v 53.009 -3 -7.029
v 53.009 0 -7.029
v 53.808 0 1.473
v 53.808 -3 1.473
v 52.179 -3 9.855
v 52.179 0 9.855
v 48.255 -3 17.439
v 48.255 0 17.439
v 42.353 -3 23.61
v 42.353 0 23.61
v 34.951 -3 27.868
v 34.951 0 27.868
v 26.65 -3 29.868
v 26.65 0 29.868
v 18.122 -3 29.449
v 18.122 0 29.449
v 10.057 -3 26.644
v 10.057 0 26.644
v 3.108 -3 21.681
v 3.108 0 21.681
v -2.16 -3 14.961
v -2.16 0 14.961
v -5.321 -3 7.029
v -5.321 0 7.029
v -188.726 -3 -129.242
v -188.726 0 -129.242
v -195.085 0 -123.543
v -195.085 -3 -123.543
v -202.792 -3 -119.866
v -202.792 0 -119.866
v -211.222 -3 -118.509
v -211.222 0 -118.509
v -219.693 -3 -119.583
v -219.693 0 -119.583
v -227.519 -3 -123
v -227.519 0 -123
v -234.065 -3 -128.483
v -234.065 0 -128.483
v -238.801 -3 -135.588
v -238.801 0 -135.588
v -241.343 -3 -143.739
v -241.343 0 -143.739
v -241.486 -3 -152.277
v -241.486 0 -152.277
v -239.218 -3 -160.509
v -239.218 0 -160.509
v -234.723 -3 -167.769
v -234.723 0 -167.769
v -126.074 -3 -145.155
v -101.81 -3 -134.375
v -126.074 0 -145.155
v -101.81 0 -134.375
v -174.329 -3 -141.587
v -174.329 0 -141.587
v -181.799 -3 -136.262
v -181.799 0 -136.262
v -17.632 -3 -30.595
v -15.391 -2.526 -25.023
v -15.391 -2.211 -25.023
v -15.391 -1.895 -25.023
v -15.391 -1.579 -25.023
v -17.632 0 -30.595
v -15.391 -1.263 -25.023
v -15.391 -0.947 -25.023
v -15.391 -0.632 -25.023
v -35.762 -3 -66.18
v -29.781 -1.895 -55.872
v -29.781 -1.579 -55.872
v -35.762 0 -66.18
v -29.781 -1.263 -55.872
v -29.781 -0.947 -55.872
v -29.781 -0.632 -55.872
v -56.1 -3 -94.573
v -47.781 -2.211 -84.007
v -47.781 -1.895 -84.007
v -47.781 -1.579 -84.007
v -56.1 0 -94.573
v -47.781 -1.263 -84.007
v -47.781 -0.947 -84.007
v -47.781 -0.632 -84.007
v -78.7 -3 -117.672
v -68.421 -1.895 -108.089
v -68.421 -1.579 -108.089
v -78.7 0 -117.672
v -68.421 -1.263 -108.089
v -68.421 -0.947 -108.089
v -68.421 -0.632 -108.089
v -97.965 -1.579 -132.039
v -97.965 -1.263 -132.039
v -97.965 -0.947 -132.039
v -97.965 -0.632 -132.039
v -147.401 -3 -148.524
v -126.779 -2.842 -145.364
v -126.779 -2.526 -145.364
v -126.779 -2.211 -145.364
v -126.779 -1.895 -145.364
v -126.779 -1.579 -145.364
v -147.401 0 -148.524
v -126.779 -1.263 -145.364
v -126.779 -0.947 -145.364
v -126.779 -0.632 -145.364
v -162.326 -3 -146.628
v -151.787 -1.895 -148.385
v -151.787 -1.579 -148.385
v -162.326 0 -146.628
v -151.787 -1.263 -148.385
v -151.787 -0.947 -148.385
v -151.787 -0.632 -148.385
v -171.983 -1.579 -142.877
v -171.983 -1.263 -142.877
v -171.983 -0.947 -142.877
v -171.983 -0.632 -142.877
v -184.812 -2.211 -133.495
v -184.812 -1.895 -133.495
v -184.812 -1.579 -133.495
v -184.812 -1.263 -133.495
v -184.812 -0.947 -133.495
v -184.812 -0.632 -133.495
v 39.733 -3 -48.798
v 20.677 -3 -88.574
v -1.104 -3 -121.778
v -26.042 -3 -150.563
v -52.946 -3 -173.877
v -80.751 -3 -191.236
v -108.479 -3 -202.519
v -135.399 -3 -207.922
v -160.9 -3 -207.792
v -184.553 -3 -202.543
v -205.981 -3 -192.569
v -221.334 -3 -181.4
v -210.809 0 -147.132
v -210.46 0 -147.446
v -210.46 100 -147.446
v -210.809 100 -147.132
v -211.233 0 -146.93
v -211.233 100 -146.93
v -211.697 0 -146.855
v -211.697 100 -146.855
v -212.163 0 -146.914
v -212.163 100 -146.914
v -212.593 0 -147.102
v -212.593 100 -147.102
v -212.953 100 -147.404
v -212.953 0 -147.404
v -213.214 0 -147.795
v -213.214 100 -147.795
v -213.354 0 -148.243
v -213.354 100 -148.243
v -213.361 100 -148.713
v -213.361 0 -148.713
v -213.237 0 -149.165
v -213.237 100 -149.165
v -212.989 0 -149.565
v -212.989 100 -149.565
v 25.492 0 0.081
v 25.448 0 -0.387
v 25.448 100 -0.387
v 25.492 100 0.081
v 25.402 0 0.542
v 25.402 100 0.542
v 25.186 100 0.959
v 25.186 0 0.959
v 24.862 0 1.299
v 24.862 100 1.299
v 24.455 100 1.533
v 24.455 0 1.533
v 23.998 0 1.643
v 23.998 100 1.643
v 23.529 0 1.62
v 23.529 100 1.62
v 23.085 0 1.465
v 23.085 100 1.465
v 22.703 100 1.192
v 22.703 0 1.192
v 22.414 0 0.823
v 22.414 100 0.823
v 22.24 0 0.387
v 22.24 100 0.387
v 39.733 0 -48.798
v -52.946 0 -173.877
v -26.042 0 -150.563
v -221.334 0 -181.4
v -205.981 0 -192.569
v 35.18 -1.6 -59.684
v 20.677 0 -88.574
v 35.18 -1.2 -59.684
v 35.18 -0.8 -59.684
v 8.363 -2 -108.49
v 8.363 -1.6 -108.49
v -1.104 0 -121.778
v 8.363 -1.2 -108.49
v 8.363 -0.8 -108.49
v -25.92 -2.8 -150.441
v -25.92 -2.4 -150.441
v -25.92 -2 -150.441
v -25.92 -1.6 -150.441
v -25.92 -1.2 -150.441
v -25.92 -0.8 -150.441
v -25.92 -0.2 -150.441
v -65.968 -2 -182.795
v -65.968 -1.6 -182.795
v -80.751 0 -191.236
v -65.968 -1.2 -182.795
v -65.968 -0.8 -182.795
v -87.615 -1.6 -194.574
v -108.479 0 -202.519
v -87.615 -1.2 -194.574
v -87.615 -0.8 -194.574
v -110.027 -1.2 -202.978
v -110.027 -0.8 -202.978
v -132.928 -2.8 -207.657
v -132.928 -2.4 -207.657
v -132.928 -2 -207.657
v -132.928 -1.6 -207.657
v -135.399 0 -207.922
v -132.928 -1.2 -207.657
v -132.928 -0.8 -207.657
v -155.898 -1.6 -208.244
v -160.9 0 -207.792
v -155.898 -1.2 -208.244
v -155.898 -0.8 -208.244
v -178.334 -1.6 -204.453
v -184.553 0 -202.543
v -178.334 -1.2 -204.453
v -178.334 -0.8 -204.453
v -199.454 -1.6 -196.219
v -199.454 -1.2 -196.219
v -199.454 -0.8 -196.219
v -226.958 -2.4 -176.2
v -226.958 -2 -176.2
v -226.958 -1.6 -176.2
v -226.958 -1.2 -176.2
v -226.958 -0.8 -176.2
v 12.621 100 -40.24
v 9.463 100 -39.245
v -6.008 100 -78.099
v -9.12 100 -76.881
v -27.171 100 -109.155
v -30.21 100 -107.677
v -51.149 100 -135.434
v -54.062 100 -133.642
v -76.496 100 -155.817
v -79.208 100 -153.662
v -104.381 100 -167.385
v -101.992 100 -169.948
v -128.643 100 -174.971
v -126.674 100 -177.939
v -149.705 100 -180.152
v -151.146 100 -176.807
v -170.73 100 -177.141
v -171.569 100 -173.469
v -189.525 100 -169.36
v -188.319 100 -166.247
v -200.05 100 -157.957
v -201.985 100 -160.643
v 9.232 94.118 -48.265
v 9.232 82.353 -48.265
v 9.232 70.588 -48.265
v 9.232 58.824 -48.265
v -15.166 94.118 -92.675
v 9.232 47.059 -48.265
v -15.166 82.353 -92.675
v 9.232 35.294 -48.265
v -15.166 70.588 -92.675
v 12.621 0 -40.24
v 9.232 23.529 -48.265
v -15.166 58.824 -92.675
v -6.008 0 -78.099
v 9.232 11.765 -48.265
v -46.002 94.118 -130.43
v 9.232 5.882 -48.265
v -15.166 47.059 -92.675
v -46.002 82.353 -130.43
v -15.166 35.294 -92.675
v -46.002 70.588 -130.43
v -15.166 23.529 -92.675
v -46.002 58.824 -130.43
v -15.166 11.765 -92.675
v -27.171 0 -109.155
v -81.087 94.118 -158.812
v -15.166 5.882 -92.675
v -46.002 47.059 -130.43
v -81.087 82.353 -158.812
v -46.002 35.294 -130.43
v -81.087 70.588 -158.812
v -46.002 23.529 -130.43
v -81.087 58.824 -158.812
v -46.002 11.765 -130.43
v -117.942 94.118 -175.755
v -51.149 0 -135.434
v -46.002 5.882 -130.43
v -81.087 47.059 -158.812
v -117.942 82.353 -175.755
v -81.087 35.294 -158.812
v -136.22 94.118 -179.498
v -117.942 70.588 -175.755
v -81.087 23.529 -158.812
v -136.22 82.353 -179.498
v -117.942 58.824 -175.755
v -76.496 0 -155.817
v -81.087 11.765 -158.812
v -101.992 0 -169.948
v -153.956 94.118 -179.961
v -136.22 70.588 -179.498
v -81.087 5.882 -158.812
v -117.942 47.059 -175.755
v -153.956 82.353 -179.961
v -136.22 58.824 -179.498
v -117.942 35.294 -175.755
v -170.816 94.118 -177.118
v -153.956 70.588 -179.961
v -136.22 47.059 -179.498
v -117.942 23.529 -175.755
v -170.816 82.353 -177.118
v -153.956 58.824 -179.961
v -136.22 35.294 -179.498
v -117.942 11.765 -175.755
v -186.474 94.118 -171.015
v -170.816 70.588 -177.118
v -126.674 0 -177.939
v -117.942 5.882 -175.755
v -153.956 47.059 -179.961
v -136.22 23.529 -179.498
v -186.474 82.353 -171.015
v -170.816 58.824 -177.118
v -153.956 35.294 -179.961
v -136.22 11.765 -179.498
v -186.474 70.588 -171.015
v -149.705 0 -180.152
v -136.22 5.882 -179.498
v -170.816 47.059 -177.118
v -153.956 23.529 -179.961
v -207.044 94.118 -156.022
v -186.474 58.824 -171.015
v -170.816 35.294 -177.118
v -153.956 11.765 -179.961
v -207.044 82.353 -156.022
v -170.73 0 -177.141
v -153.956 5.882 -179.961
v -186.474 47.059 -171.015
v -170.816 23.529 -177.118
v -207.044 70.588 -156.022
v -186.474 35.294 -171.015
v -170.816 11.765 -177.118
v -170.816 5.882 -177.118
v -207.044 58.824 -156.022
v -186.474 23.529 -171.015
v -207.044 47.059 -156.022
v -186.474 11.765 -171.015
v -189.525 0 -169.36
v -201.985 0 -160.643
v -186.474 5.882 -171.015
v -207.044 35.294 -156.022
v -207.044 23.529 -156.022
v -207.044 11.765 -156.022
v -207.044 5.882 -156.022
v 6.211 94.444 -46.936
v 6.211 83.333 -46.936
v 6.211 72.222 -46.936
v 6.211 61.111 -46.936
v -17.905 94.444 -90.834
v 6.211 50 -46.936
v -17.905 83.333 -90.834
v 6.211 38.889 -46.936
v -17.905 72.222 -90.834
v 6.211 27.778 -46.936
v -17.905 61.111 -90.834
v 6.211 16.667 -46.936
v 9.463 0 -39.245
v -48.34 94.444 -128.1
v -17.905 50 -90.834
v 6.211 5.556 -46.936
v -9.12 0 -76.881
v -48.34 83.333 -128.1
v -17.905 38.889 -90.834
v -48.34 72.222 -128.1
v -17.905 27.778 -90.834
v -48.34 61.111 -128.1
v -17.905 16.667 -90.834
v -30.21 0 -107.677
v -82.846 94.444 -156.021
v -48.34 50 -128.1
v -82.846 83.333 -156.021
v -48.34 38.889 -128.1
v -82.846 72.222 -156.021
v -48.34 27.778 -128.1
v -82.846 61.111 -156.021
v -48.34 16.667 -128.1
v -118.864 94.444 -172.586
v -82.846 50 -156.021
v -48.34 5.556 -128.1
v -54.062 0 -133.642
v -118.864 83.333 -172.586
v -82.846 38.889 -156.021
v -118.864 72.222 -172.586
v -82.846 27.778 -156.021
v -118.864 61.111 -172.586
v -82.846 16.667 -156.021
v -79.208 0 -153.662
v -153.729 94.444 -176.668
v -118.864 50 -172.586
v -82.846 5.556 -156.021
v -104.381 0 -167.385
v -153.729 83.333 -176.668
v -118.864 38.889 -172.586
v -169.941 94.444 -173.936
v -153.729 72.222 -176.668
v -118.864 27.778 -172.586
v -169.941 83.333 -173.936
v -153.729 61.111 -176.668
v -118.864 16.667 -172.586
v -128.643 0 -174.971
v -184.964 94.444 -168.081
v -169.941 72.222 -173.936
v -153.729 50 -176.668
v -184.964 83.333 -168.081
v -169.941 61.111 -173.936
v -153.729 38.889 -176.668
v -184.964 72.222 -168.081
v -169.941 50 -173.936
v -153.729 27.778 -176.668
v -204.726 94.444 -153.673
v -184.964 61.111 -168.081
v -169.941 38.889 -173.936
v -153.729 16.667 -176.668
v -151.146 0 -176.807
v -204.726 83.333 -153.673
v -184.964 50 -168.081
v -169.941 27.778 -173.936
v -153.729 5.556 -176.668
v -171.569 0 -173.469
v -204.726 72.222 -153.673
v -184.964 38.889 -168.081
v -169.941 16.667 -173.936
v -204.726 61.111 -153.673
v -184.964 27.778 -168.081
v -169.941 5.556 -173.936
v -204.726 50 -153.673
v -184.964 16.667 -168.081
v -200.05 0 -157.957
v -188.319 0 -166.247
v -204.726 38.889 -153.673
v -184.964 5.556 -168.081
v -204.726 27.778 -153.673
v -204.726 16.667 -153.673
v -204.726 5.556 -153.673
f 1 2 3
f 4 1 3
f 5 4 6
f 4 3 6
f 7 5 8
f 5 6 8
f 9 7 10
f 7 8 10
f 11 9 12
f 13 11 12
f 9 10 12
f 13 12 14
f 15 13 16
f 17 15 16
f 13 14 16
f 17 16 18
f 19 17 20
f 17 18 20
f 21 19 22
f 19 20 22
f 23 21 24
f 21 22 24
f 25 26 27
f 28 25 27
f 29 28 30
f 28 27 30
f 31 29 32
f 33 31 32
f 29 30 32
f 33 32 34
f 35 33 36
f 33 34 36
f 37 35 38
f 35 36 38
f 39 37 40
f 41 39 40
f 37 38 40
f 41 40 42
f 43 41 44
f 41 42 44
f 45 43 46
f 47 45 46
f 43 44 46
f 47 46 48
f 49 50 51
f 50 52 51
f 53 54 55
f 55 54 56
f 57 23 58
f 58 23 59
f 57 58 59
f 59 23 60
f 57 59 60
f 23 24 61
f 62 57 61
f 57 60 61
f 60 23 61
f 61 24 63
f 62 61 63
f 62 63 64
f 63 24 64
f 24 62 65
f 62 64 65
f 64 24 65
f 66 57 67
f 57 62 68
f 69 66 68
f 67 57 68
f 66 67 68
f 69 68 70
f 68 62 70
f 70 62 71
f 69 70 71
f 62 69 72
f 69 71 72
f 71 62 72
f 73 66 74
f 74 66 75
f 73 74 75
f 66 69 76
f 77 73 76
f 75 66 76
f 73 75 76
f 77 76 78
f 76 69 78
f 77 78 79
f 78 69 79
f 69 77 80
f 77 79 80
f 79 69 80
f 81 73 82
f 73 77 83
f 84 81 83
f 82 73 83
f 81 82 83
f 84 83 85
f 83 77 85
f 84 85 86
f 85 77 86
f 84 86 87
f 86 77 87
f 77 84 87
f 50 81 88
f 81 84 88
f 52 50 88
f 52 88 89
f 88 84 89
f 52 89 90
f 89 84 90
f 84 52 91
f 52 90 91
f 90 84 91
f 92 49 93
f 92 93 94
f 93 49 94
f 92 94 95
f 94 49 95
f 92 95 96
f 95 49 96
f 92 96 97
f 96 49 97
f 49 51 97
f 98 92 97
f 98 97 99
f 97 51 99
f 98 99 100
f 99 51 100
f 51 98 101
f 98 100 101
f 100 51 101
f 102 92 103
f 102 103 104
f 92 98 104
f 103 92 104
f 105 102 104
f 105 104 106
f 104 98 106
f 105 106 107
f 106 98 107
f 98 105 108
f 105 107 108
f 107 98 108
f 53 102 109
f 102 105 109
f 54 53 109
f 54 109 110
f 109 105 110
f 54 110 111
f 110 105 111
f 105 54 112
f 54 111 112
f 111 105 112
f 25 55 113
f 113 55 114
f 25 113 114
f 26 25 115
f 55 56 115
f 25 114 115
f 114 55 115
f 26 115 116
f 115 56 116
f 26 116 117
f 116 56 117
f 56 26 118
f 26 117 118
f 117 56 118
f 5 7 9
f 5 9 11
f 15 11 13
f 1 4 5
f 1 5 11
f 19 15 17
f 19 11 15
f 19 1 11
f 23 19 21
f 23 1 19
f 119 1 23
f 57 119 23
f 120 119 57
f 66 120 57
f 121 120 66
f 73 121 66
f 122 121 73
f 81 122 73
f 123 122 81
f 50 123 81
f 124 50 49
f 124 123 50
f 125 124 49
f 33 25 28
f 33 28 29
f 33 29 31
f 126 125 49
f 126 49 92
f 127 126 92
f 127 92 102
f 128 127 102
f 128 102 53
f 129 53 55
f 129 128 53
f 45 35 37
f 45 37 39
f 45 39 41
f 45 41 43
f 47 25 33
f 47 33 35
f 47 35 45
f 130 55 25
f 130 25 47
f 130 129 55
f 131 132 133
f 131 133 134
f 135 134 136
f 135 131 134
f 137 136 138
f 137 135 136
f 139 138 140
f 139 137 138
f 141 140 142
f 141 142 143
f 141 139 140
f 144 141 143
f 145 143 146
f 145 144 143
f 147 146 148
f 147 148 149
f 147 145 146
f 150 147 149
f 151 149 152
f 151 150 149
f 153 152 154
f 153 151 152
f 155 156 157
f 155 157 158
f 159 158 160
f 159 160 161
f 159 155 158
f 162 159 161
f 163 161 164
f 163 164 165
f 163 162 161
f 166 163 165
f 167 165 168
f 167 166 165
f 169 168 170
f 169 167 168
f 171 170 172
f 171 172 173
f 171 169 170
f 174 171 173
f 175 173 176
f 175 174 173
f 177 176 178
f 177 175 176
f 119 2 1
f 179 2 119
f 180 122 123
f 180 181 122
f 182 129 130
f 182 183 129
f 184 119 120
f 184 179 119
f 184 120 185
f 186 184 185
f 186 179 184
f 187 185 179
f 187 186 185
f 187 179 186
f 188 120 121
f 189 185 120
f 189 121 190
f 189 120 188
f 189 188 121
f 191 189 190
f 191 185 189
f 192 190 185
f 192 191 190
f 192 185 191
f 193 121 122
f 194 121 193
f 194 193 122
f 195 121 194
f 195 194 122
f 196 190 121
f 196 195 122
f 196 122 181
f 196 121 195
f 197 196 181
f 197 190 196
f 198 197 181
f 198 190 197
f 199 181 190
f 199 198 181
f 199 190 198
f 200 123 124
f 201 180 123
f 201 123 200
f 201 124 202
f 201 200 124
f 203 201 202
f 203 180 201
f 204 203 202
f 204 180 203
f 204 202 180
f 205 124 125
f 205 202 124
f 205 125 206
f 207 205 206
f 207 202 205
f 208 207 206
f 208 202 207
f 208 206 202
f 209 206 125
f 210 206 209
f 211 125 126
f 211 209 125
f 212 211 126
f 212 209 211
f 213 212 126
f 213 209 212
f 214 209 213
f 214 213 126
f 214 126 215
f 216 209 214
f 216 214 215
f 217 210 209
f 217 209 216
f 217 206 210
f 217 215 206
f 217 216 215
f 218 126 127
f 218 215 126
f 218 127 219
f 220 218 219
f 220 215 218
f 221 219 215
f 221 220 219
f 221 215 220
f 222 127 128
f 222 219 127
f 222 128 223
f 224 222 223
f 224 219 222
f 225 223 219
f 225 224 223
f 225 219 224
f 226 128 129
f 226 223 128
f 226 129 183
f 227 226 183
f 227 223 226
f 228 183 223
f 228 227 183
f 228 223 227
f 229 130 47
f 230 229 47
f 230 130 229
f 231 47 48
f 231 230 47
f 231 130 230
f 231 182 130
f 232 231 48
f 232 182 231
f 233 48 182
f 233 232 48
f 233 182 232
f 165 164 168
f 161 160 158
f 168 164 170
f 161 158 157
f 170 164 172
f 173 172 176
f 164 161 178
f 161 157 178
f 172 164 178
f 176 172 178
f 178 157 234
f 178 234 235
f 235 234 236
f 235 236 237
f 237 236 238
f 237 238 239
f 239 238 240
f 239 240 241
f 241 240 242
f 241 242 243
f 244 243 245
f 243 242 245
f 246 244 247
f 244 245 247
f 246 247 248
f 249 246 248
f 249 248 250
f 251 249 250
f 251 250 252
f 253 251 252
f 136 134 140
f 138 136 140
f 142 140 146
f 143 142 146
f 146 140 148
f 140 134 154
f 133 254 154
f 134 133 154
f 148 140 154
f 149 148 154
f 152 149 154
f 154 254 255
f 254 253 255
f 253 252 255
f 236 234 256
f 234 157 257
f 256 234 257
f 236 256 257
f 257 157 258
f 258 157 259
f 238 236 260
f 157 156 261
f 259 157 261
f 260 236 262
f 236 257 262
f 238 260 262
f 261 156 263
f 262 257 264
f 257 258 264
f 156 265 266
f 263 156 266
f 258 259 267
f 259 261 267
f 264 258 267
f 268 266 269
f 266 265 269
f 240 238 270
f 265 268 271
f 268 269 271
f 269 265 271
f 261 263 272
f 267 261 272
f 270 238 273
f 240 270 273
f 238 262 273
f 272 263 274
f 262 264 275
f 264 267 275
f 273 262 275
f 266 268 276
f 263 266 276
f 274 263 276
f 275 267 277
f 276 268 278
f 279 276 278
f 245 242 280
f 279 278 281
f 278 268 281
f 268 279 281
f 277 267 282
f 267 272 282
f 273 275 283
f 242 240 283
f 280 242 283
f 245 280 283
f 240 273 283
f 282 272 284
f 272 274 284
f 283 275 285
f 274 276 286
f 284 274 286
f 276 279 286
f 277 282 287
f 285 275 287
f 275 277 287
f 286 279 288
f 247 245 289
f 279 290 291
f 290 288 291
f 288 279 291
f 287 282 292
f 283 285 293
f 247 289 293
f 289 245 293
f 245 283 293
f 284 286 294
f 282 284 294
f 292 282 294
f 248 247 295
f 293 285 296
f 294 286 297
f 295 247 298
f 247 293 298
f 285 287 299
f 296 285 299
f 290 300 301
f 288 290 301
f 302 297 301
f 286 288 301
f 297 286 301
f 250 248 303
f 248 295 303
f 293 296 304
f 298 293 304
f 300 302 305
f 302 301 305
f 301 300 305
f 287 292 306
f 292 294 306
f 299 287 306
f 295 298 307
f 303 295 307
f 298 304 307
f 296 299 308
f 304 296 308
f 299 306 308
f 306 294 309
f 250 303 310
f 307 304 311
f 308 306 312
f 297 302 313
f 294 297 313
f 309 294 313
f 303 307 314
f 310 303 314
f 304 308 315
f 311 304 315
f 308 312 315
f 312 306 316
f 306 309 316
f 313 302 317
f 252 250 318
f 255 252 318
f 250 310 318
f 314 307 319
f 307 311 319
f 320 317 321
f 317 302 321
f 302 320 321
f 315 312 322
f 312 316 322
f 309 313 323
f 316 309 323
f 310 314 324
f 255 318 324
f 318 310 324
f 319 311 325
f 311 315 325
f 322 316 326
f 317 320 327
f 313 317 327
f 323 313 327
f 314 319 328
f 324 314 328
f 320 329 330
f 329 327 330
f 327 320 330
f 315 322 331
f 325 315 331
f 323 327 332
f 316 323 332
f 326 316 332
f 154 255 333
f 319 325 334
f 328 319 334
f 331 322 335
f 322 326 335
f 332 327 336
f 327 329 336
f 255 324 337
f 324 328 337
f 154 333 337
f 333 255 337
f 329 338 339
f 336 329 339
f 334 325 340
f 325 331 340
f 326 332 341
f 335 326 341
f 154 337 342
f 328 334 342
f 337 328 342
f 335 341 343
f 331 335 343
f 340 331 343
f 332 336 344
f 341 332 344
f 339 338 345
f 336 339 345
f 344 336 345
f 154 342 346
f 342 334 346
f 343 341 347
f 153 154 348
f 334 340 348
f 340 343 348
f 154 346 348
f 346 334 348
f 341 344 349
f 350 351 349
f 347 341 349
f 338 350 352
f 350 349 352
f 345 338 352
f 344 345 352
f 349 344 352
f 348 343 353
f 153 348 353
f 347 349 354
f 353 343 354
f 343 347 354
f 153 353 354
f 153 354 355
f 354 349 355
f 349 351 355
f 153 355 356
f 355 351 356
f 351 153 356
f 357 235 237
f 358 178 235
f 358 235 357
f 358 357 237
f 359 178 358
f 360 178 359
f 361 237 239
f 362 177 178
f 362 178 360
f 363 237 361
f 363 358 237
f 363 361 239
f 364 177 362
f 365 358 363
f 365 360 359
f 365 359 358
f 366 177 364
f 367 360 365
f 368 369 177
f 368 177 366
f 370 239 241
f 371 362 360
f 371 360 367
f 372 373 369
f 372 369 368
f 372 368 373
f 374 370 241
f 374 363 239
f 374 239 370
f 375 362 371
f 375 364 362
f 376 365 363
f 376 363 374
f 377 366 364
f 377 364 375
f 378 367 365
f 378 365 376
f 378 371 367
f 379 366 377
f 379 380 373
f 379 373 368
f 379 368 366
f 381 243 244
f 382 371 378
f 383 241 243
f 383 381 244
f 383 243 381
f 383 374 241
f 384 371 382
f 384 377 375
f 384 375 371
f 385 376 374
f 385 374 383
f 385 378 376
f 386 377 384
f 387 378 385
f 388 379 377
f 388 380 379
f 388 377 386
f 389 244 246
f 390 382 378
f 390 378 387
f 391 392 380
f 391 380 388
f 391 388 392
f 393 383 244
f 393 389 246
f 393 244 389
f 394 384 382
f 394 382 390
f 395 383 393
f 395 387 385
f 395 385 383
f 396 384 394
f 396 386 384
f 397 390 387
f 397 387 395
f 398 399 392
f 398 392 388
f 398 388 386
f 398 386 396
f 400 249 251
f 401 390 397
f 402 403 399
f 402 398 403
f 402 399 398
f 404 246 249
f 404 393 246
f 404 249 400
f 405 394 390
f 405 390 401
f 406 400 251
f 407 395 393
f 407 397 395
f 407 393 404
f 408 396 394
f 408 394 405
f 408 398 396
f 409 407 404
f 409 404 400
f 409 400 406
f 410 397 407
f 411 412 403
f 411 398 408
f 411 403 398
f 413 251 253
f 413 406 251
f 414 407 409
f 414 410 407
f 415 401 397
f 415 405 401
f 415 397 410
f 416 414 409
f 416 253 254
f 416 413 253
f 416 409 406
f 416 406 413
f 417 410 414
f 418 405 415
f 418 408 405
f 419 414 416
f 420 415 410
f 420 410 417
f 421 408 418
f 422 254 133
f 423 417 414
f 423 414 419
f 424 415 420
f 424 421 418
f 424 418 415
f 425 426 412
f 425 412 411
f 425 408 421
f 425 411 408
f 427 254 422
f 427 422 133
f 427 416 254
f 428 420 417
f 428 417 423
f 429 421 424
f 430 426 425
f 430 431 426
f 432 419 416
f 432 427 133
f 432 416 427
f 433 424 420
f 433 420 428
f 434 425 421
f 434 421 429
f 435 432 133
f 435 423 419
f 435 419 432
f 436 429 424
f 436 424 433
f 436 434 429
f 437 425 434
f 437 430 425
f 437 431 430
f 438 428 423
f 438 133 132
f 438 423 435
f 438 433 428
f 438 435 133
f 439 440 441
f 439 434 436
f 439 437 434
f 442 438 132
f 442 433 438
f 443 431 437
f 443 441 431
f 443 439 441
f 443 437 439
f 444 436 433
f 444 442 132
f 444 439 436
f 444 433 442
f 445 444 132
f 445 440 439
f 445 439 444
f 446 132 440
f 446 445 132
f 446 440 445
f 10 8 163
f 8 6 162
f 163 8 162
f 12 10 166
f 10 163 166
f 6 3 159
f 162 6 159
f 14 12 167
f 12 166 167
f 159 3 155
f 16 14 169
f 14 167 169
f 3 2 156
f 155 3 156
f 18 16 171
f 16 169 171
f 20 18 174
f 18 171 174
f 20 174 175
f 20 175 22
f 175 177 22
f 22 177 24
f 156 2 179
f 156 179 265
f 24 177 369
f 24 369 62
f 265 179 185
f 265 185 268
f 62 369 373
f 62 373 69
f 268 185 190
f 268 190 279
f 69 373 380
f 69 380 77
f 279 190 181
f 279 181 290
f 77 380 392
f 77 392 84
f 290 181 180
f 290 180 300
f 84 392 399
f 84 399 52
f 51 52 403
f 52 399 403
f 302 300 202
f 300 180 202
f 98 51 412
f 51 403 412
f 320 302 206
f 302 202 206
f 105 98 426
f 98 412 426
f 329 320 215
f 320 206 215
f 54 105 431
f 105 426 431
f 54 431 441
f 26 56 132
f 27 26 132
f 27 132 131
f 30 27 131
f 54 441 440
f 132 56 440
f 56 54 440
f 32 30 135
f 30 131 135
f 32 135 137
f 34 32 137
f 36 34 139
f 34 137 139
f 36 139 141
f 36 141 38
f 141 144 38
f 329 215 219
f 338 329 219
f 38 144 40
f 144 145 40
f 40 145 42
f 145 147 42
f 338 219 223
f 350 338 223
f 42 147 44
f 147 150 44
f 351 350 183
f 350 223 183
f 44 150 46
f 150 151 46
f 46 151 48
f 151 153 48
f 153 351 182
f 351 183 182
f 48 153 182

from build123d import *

# Parameters (mm, degrees)
ASPA_DEPTH          = 100
BOSS_EXTRUDE1_DEPTH = 3


with BuildPart() as part:
    # Sketch1 → Aspa (new body)
    with BuildSketch(Plane(origin=(0, 0, 0), x_dir=(1, 0, 0), z_dir=(0, 1, 0))):
        with BuildLine():
            ThreePointArc((25.447793126, 0.386570406), (24.230286438, -1.604077093), (22.239638939, -0.386570406))
            add(Edge.make_bspline(
                [(22.239638939, -0.386570406), (21.757478048, 1.614160196), (20.749121719, 5.597302334), (18.536030085, 13.574591529), (14.168694774, 27.479743189), (6.550840337, 47.079936231), (-4.628442304, 69.734907552), (-21.975568559, 98.239463115), (-47.651343304, 129.677792921), (-82.591872401, 157.938934972), (-112.981407164, 171.898903888), (-136.706178937, 176.753073489), (-153.882706061, 177.19977096), (-170.139849975, 174.457544689), (-182.693050278, 169.564346219), (-192.015134762, 164.134990799), (-198.616330487, 159.32363019), (-203.771296986, 154.710229964), (-207.666830265, 150.676861459), (-209.548220456, 148.533756447), (-210.459571896, 147.44572479)],
                knots=[1.285391812, 1.285391812, 1.285391812, 1.285391812, 1.319128815, 1.352865818, 1.420339824, 1.555287836, 1.690235848, 1.82518386, 2.095079884, 2.364975908, 2.634871932, 2.769819944, 2.904767956, 3.039715967, 3.174663979, 3.242137985, 3.309611991, 3.377085997, 3.410823, 3.444560003, 3.444560003, 3.444560003, 3.444560003], degree=3))
            ThreePointArc((-210.459571896, 147.44572479), (-212.783966565, 147.240324157), (-212.989367198, 149.564718827))
            add(Edge.make_bspline(
                [(25.447793126, 0.386570406), (24.469423216, 4.446324434), (22.333224695, 12.496143625), (17.278981997, 28.592037716), (9.575585068, 48.408864531), (-1.732113789, 71.325665764), (-19.282855172, 100.164756936), (-45.285499338, 132.010247367), (-80.787938764, 160.741243667), (-111.866153701, 175.039124584), (-136.310465657, 180.046556902), (-154.101500744, 180.513328396), (-171.016980761, 177.663303296), (-184.108550637, 172.560778181), (-193.824522276, 166.901653535), (-200.696906081, 161.892236402), (-206.053892172, 157.097615744), (-210.09605989, 152.912239242), (-212.044923282, 150.692258471), (-212.989367198, 149.564718827)],
                knots=[1.285391812, 1.285391812, 1.285391812, 1.285391812, 1.352865818, 1.420339824, 1.555287836, 1.690235848, 1.82518386, 2.095079884, 2.364975908, 2.634871932, 2.769819944, 2.904767956, 3.039715967, 3.174663979, 3.242137985, 3.309611991, 3.377085997, 3.410823, 3.444560003, 3.444560003, 3.444560003, 3.444560003], degree=3))
        make_face()
    extrude(amount=ASPA_DEPTH)

    # Sketch1<6> → Boss-Extrude1 (add)
    with BuildSketch(Plane(origin=(0, 0, 0), x_dir=(1, 0, 0), z_dir=(0, 1, 0))):
        with BuildLine():
            ThreePointArc((53.008754094, 7.028552828), (30.87226886, -29.165038062), (-5.321322029, -7.028552828))
            add(Edge.make_bspline(
                [(-5.321322029, -7.028552828), (-5.752950613, -5.237506451), (-6.655037469, -1.674110926), (-8.6398779, 5.480878278), (-11.443110905, 14.40659541), (-15.310525869, 25.045167991), (-21.110443607, 39.04951786), (-29.511654733, 56.07370943), (-45.107779267, 81.696632202), (-67.97631331, 109.640843996), (-98.089242139, 133.864294121), (-122.562455739, 144.921585832), (-140.105714345, 148.459050781), (-152.003061212, 148.733301905), (-162.60449903, 146.917163479), (-170.532615395, 143.822271696), (-176.470851118, 140.366842739), (-180.742294705, 137.256967741), (-184.161729253, 134.200415757), (-186.797539391, 131.472934141), (-188.099273447, 129.990261782), (-188.726330433, 129.241639658)],
                knots=[1.285391812, 1.285391812, 1.285391812, 1.285391812, 1.319128815, 1.352865818, 1.420339824, 1.48781383, 1.555287836, 1.690235848, 1.82518386, 2.095079884, 2.364975908, 2.634871932, 2.769819944, 2.904767956, 3.039715967, 3.174663979, 3.242137985, 3.309611991, 3.377085997, 3.410823, 3.444560003, 3.444560003, 3.444560003, 3.444560003], degree=3))
            ThreePointArc((-188.726330433, 129.241639658), (-230.988051698, 125.507082694), (-234.722608661, 167.768803959))
            add(Edge.make_bspline(
                [(53.008754094, 7.028552828), (51.929817399, 11.505609563), (49.571841508, 20.39092904), (44.012354136, 38.093264581), (35.556422664, 59.844015849), (23.1511521, 84.986891525), (3.849324765, 116.707571722), (-24.960519687, 152.047203238), (-65.290568749, 184.815877475), (-102.285114039, 202.016459154), (-132.910914262, 208.340551294), (-155.981206852, 208.979905408), (-178.552102656, 205.203280991), (-199.813171225, 196.924192445), (-215.737282567, 186.496778707), (-227.077525578, 176.342226424), (-232.269234058, 170.69780491), (-234.722608661, 167.768803959)],
                knots=[1.285391812, 1.285391812, 1.285391812, 1.285391812, 1.352865818, 1.420339824, 1.555287836, 1.690235848, 1.82518386, 2.095079884, 2.364975908, 2.634871932, 2.769819944, 2.904767956, 3.039715967, 3.174663979, 3.309611991, 3.377085997, 3.444560003, 3.444560003, 3.444560003, 3.444560003], degree=3))
        make_face()
    extrude(amount=-BOSS_EXTRUDE1_DEPTH)


solid = part.part
